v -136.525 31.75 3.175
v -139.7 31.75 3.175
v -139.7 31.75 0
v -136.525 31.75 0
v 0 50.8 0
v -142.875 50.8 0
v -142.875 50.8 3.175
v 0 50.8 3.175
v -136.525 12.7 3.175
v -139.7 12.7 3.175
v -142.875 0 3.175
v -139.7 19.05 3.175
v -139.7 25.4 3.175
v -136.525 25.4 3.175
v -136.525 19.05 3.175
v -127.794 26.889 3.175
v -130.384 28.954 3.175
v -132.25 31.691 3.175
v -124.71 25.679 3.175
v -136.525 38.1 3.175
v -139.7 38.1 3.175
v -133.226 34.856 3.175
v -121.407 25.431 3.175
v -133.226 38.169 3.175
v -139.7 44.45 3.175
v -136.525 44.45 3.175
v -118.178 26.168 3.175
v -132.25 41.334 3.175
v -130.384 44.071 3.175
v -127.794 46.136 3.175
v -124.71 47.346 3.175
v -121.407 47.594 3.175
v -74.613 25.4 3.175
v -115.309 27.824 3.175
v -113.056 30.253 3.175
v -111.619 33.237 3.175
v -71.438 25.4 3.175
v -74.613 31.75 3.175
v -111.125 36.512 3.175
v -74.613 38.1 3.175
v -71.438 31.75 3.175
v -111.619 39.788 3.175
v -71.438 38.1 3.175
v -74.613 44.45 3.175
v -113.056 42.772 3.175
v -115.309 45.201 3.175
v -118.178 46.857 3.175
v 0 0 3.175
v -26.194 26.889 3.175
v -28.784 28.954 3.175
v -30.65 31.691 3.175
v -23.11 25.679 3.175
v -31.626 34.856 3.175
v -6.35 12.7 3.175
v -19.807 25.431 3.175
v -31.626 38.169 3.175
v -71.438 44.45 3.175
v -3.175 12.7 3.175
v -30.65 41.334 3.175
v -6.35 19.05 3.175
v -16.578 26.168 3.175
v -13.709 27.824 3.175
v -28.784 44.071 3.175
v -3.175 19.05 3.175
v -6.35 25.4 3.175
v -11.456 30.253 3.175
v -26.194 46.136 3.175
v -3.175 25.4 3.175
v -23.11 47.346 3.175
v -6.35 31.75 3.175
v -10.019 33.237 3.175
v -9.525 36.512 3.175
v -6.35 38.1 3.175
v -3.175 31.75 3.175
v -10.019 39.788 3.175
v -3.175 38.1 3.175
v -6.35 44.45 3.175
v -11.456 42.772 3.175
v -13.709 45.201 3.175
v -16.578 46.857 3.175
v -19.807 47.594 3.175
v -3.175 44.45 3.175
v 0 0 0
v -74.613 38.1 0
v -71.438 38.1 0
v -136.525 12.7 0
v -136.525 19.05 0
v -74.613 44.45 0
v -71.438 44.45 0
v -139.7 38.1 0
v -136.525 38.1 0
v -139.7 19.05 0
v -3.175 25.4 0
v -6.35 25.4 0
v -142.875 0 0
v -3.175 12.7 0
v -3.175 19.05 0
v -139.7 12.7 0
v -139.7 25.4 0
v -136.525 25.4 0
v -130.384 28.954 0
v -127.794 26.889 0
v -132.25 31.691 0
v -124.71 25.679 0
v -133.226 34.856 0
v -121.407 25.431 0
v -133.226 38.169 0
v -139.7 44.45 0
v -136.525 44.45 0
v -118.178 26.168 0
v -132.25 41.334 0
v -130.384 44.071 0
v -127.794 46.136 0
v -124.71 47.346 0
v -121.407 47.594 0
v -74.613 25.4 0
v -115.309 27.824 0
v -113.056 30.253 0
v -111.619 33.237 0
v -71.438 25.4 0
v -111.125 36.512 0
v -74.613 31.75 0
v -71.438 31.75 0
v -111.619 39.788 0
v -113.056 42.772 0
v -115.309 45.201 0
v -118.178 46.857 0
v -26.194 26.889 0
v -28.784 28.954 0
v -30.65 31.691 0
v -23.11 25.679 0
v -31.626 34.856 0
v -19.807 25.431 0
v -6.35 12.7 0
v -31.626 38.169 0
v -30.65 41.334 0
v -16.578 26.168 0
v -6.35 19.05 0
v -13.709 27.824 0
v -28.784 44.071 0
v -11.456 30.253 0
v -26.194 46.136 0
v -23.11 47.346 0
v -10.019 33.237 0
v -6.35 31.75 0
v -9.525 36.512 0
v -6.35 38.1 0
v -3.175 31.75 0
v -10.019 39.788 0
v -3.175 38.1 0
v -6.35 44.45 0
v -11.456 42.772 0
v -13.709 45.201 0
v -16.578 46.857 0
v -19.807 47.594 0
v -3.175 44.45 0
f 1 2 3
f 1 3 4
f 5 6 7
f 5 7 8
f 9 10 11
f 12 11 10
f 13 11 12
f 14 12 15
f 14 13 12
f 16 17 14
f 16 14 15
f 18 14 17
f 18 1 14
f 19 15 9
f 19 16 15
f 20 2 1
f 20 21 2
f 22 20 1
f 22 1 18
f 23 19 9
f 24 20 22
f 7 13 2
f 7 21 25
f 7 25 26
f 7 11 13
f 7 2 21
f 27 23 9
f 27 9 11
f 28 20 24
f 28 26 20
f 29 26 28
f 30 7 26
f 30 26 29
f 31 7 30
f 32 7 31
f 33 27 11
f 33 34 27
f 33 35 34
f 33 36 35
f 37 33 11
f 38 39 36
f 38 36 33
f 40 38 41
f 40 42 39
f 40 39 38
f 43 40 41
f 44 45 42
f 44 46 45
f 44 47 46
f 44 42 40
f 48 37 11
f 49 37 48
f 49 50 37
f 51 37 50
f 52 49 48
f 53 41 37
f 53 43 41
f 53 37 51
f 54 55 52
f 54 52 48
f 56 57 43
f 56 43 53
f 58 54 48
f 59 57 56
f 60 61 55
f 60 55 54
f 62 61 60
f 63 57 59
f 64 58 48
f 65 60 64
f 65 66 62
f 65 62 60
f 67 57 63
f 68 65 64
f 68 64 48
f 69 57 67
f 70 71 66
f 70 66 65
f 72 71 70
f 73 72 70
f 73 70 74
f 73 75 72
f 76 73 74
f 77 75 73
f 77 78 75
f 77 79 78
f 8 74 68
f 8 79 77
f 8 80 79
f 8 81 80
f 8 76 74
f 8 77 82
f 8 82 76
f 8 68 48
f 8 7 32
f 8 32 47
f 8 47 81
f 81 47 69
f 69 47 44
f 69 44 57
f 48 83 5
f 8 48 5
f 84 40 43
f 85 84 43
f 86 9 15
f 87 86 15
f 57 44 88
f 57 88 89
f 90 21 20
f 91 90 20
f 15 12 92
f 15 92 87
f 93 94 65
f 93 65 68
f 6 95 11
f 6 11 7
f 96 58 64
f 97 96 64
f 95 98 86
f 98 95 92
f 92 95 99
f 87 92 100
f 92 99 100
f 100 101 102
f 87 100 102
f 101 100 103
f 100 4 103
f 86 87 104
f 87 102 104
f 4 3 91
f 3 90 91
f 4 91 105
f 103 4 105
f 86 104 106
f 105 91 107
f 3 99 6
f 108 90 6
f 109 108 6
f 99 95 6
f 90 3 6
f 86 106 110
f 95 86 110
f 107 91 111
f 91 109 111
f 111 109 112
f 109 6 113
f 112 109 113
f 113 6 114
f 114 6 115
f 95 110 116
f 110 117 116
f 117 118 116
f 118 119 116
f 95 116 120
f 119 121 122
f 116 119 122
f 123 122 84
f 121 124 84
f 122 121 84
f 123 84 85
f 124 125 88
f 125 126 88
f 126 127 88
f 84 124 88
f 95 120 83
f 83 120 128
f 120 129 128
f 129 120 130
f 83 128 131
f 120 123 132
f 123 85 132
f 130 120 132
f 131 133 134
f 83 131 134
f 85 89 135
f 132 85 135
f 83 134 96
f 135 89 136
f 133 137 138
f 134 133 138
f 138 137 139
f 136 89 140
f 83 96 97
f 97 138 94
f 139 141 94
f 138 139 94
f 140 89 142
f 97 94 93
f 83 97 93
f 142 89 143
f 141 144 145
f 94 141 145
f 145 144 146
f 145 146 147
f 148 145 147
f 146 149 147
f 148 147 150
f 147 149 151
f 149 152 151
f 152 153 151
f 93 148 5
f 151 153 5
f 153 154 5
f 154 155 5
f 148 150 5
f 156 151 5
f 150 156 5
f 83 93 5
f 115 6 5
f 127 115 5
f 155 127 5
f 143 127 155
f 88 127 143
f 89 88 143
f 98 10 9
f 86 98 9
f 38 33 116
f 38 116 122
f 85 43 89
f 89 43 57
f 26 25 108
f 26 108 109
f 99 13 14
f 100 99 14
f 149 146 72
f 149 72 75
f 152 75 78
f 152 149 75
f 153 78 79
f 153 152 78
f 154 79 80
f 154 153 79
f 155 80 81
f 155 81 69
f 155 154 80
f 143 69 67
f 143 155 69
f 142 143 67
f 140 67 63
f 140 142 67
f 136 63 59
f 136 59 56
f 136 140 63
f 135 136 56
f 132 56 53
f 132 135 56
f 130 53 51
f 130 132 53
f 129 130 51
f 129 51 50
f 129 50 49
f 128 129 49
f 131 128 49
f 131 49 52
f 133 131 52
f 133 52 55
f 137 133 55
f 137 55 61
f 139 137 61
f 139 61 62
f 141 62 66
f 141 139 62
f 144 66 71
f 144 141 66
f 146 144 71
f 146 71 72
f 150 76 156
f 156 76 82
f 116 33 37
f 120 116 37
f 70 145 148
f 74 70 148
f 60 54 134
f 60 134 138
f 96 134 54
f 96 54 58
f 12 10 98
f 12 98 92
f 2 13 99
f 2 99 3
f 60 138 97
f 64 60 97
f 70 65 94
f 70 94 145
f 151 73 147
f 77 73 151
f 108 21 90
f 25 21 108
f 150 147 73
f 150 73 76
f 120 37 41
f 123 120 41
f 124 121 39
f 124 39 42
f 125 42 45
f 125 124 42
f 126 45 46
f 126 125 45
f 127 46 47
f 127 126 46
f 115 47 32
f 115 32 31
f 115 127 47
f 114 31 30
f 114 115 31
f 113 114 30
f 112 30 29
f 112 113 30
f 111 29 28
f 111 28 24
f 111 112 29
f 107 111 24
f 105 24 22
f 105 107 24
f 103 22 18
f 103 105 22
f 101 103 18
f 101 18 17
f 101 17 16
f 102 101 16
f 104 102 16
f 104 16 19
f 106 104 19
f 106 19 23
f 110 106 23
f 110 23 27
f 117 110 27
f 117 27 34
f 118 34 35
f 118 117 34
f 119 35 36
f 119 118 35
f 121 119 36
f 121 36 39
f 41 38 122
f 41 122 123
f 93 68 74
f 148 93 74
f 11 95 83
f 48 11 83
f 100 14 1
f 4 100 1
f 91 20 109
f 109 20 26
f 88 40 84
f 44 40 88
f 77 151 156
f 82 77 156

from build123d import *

# Parameters (mm, degrees)
F0_W     = 142.875
F0_H     = 50.8
F0_R     = 11.1125
F1_DEPTH = 3.175
F2_W     = 3.175
F2_H     = 6.35
F3_DEPTH = 3.175


with BuildPart() as f1:
    # F0 (on Top) → F1 (new body)
    with BuildSketch(Plane.XY):
        with Locations((-71.4375, 25.4)):
            Rectangle(F0_W, F0_H)
        with Locations((-122.2375, 36.5125)):
            Circle(F0_R, mode=Mode.SUBTRACT)
        with Locations((-20.6375, 36.5125)):
            Circle(F0_R, mode=Mode.SUBTRACT)
    extrude(amount=F1_DEPTH)

    # F2 (on face) → F3 (cut, through all)
    with BuildSketch(Plane.XY.offset(3.175)):
        with Locations((-4.7625, 41.275)):
            Rectangle(F2_W, F2_H)
        with Locations((-4.7625, 28.575)):
            Rectangle(F2_W, F2_H)
        with Locations((-4.7625, 15.875)):
            Rectangle(F2_W, F2_H)
        with Locations((-138.1125, 41.275)):
            Rectangle(F2_W, F2_H)
        with Locations((-138.1125, 28.575)):
            Rectangle(F2_W, F2_H)
        with Locations((-138.1125, 15.875)):
            Rectangle(F2_W, F2_H)
        with Locations((-73.025, 41.275)):
            Rectangle(F2_W, F2_H)
        with Locations((-73.025, 28.575)):
            Rectangle(F2_W, F2_H)
    extrude(amount=-F3_DEPTH, mode=Mode.SUBTRACT)


solid = f1.part
